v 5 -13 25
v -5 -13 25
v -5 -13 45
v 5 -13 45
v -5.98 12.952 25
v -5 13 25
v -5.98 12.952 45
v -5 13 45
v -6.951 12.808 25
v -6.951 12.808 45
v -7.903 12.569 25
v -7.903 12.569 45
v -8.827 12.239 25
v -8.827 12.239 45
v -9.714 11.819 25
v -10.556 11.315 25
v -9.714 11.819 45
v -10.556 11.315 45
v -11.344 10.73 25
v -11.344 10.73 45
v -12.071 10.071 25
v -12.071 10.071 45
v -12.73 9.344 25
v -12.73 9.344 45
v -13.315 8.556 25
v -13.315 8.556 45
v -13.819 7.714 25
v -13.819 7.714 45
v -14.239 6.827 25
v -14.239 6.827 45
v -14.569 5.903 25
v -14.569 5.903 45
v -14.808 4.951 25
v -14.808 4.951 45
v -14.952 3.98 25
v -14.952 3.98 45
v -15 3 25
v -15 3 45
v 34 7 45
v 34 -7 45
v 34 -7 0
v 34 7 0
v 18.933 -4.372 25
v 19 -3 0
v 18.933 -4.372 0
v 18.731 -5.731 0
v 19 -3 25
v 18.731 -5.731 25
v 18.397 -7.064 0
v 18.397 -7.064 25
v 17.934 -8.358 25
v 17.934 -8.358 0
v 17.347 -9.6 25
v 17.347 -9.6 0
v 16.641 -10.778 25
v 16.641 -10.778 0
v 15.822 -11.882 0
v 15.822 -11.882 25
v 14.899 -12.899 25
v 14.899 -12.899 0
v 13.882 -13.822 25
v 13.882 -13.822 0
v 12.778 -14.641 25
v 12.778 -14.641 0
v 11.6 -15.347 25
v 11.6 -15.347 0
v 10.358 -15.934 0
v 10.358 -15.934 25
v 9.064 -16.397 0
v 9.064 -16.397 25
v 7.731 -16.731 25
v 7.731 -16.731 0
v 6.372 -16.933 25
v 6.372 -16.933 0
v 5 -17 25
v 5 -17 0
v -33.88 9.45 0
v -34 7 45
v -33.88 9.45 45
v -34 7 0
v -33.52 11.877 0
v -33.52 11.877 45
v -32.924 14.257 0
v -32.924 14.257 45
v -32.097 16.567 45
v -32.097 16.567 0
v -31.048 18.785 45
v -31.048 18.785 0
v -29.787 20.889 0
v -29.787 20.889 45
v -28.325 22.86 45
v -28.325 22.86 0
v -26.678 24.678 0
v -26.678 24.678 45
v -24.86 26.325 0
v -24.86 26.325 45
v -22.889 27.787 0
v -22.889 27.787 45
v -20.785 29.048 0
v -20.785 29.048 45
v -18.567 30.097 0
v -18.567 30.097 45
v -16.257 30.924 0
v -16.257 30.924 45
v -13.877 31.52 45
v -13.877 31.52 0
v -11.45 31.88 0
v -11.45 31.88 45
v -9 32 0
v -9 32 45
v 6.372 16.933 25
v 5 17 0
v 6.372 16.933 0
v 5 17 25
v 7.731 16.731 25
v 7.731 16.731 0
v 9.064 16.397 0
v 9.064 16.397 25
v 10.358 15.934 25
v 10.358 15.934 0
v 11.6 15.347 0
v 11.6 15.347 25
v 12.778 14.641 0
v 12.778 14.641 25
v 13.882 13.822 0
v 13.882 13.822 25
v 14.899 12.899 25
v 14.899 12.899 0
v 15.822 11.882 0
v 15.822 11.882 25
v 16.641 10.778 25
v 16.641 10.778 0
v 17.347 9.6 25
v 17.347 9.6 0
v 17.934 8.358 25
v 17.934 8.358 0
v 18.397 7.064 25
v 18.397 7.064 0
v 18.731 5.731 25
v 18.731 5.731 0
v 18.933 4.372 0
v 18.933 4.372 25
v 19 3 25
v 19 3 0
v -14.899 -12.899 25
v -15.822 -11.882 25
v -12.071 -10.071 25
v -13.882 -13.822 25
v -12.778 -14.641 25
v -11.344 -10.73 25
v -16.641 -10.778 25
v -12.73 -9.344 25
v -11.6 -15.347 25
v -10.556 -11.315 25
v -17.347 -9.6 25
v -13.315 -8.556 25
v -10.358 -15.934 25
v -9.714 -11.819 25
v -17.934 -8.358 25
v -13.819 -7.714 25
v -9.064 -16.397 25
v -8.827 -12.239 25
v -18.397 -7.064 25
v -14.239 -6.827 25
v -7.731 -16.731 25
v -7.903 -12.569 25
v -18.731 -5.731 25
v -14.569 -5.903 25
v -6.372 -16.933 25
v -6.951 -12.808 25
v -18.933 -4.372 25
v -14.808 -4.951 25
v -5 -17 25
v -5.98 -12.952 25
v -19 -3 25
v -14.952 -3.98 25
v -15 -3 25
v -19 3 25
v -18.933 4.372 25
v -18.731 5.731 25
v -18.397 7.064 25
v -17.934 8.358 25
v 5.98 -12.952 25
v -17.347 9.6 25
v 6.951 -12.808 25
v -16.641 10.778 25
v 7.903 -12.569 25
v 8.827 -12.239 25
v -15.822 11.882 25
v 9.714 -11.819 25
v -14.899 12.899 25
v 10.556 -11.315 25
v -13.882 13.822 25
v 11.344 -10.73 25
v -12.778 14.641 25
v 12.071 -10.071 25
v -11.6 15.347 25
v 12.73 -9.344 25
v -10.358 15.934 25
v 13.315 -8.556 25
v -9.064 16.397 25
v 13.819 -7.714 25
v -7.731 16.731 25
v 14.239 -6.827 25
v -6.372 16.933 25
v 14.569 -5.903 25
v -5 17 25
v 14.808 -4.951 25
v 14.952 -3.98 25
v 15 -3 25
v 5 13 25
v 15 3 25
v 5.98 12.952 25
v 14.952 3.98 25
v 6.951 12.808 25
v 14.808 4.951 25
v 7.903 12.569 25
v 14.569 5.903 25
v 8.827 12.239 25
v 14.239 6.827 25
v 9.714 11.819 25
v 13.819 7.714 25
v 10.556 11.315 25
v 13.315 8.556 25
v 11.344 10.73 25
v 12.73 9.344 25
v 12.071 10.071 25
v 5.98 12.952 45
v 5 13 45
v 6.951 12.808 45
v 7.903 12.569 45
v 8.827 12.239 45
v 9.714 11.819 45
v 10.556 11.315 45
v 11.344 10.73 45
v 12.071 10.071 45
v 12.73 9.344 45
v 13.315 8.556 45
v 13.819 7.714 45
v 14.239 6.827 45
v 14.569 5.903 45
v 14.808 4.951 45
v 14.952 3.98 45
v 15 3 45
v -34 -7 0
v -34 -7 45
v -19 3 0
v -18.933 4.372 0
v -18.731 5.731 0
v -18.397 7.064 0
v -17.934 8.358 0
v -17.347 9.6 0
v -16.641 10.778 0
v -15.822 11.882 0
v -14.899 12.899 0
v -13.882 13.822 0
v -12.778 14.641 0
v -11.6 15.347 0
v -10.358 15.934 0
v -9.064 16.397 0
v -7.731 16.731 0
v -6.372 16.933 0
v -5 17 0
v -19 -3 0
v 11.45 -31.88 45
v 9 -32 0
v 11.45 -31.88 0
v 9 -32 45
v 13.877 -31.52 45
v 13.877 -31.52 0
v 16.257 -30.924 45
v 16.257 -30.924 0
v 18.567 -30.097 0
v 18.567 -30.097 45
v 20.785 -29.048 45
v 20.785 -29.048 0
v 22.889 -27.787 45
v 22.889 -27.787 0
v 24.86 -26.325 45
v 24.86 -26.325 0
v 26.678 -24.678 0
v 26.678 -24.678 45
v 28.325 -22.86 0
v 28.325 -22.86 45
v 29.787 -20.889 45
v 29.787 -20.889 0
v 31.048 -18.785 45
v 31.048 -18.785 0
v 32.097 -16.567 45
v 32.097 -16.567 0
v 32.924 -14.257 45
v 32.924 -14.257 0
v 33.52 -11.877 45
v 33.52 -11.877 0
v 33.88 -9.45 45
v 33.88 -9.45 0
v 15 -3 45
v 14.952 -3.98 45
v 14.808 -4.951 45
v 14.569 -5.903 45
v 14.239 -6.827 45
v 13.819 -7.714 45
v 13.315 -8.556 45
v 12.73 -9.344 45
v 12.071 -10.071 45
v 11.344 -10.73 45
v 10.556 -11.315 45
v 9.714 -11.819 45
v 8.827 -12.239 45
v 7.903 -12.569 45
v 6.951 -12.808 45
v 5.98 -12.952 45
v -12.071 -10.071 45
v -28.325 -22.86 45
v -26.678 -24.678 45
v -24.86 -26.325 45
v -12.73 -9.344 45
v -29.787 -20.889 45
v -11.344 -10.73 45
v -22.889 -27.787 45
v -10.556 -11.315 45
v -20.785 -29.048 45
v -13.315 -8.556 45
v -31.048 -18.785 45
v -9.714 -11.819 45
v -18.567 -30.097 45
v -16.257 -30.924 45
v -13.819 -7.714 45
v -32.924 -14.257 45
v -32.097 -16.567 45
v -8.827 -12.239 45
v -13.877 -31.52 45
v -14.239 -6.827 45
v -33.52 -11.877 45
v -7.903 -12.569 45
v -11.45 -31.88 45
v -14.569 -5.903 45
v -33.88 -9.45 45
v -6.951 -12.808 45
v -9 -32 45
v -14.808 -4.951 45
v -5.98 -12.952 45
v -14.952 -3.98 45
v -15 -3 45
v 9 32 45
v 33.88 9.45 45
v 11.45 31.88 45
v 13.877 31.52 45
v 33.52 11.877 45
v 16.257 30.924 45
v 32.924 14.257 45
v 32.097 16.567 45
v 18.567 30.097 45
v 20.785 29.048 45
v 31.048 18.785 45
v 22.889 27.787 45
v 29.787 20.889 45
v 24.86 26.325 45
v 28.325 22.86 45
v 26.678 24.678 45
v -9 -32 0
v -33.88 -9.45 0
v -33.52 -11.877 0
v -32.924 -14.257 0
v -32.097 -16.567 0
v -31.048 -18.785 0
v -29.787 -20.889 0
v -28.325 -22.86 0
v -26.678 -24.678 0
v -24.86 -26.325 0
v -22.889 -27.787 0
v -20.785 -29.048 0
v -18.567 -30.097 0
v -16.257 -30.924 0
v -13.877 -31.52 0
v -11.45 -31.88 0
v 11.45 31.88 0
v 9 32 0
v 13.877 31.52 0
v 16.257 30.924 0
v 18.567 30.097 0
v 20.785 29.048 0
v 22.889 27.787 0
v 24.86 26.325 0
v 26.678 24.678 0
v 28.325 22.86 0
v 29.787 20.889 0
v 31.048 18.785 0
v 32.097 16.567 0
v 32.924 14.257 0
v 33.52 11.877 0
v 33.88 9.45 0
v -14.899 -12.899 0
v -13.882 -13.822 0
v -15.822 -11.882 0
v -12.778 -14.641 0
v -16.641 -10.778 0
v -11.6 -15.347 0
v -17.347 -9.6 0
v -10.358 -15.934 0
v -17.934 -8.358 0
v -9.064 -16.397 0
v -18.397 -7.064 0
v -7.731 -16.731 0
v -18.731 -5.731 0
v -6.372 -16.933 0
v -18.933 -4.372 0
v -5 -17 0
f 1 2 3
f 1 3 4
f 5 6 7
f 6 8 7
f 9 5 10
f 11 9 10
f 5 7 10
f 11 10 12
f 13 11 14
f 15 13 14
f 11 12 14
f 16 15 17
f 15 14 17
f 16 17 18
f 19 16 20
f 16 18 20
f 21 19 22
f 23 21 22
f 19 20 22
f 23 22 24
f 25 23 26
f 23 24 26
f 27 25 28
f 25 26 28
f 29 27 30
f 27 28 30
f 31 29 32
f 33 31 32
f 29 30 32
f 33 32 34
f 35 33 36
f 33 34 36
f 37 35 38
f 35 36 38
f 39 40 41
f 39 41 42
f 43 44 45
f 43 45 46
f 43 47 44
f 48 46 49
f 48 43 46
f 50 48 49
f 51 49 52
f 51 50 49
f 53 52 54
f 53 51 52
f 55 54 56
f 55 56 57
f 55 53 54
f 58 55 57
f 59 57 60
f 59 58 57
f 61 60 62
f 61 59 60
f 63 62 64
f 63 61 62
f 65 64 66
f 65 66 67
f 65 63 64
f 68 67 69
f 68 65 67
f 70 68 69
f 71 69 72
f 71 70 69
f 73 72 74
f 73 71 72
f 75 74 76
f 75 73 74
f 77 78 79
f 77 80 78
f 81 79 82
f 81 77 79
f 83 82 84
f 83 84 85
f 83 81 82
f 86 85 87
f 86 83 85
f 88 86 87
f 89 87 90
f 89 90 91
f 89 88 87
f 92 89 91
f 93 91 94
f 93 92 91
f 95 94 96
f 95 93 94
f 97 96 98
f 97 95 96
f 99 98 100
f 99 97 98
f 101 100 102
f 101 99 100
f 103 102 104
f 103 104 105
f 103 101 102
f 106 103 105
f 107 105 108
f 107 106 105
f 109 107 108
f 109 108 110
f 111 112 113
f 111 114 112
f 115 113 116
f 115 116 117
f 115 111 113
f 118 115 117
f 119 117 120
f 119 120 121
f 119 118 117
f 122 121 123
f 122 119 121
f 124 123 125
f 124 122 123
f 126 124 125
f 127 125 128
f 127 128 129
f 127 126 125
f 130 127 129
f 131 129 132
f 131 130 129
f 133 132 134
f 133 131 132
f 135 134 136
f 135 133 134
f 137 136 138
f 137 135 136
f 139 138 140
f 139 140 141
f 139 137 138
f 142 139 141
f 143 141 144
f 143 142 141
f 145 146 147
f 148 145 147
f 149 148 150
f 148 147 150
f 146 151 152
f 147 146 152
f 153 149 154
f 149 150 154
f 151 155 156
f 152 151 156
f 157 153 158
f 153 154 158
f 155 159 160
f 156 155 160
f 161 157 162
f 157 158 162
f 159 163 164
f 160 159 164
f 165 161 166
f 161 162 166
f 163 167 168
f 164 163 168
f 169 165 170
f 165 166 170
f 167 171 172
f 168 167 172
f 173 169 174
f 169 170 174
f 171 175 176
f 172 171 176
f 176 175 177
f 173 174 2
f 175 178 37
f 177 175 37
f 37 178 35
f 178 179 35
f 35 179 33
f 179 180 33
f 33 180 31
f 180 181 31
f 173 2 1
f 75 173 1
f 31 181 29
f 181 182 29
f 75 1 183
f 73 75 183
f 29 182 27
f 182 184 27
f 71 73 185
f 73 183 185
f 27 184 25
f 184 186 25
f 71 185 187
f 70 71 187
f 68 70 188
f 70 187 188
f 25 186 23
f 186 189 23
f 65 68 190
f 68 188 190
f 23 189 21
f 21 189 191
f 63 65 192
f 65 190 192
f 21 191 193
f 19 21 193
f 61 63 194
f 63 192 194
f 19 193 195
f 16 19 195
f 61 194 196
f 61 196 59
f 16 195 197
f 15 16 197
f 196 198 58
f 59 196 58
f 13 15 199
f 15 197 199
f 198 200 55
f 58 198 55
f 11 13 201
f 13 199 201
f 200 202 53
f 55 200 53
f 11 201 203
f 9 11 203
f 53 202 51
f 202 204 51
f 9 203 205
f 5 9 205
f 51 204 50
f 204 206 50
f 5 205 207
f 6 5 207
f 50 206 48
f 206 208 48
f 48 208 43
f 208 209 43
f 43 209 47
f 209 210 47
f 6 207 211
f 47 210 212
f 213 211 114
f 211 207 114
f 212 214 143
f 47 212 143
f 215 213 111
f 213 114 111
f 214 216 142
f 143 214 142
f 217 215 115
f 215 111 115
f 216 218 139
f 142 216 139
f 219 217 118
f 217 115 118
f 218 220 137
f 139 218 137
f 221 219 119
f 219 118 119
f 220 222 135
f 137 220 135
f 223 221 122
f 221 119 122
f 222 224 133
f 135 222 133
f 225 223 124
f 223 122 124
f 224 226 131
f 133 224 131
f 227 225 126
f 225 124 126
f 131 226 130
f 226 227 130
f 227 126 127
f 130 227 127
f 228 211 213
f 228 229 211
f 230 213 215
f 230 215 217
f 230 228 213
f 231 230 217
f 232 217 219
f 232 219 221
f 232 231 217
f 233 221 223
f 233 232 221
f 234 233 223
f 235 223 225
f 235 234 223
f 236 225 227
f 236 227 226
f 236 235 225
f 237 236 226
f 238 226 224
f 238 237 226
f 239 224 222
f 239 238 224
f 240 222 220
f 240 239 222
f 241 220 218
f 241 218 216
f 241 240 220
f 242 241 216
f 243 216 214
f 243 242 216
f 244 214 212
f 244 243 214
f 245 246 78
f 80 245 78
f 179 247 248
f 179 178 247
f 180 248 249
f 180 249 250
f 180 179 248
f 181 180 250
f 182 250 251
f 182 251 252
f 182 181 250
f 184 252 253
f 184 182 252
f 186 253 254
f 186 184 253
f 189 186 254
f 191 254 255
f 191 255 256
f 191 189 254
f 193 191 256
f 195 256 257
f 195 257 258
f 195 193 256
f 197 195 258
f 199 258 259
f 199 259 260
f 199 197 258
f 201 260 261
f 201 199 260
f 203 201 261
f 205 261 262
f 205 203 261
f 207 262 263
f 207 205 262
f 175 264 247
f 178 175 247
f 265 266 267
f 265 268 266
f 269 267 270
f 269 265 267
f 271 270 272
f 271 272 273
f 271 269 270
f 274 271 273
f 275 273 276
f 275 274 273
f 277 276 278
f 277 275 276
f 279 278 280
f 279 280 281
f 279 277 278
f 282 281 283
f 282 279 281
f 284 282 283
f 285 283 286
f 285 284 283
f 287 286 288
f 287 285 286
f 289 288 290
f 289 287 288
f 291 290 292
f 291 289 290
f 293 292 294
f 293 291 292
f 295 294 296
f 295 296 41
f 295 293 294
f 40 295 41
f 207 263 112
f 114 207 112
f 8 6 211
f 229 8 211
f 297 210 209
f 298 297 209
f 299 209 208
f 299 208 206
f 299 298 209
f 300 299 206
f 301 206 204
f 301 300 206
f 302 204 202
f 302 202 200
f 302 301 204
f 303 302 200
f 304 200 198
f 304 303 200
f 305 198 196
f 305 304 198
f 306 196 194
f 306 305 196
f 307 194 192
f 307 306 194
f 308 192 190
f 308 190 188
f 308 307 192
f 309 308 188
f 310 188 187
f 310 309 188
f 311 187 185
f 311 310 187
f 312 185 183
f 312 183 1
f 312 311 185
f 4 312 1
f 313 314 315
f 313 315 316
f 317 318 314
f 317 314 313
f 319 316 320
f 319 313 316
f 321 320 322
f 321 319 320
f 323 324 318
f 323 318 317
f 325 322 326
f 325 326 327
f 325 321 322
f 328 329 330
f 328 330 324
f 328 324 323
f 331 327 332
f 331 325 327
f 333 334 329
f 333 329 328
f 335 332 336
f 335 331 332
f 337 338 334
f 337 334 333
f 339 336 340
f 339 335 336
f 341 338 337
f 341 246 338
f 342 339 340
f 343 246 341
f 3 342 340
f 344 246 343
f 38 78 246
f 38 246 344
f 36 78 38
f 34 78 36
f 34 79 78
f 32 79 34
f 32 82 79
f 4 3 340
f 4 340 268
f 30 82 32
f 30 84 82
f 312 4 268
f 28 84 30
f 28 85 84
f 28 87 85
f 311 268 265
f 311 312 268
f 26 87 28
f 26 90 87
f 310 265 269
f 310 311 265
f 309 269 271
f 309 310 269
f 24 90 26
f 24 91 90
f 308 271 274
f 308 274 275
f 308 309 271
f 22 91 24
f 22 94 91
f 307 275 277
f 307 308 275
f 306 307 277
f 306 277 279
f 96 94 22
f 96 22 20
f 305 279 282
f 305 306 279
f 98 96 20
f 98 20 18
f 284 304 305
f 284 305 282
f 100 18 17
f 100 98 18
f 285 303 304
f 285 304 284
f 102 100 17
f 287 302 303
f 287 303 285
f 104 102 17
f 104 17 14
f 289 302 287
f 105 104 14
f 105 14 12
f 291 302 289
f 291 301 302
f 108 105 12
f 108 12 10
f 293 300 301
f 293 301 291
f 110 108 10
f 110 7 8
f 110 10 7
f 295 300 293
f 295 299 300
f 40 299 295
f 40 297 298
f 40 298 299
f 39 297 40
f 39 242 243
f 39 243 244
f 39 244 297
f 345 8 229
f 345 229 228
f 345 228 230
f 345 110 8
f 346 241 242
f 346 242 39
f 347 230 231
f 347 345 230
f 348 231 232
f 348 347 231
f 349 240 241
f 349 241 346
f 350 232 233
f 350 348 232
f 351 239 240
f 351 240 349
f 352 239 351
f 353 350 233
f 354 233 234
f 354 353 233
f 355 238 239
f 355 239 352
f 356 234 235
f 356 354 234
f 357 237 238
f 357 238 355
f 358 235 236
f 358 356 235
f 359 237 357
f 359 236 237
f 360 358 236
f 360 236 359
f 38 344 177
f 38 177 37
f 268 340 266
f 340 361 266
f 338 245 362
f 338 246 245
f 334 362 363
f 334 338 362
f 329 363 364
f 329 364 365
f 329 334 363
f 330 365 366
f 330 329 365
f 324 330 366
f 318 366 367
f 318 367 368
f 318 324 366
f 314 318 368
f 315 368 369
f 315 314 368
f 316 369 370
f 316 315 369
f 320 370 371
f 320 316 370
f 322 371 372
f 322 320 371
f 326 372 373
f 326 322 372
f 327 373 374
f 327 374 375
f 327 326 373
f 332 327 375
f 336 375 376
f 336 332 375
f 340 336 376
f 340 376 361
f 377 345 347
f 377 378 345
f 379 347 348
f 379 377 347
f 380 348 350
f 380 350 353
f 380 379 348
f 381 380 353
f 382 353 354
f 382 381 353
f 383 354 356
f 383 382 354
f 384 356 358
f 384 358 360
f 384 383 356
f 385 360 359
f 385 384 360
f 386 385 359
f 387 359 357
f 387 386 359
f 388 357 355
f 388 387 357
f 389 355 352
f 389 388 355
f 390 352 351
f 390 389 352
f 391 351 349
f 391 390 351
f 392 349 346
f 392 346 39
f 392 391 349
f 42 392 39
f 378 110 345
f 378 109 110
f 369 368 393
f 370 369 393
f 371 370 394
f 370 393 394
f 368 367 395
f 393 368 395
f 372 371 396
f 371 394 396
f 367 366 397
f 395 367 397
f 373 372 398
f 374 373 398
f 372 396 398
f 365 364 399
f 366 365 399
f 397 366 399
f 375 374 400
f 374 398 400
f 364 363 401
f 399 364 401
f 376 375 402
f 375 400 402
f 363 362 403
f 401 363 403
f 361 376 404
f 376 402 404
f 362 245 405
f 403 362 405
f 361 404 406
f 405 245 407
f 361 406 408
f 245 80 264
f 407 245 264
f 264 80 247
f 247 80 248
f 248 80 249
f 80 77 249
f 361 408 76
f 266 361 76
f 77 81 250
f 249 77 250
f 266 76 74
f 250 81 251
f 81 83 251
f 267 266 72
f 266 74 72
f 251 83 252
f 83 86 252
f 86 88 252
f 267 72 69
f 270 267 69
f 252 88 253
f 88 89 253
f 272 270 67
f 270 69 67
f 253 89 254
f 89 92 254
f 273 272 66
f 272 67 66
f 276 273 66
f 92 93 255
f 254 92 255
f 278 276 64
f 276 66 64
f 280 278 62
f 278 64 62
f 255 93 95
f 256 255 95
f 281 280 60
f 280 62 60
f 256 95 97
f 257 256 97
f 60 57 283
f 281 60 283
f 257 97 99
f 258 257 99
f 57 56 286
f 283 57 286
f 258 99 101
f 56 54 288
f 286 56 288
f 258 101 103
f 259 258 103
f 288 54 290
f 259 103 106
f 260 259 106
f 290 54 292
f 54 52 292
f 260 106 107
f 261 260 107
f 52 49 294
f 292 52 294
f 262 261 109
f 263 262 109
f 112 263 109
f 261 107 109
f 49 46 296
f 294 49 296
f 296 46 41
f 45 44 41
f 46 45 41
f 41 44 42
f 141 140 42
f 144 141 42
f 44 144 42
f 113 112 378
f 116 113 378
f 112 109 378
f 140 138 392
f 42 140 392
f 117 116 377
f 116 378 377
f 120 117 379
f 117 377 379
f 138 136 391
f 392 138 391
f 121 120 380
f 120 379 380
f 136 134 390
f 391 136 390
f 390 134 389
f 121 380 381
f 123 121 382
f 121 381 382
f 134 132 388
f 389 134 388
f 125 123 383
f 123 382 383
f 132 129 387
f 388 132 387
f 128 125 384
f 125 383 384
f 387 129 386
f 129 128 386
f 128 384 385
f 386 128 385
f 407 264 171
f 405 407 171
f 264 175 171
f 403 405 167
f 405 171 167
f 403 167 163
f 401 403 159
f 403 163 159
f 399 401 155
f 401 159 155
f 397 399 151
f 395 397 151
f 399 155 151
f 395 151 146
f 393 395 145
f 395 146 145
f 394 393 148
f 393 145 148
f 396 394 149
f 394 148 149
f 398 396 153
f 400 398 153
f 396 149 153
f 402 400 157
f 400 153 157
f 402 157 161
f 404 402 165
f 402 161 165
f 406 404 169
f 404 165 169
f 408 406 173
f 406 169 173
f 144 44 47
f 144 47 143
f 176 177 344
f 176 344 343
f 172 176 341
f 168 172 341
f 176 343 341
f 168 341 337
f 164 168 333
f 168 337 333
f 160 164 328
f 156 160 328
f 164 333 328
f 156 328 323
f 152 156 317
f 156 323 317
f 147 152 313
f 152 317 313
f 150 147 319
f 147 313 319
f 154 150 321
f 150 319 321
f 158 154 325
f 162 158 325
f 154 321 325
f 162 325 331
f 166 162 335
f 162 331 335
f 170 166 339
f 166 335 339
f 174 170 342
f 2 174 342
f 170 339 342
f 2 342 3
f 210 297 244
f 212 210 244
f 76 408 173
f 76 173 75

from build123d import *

# Parameters (mm, degrees)
F0_W     = 68
F0_H     = 64
F0_W_2   = 38
F0_H_2   = 34
F1_DEPTH = 25
F2_W     = 68
F2_H     = 64
F2_W_2   = 38
F2_H_2   = 34
F2_W_3   = 29.9999998808
F2_H_3   = 25.9999998808
F3_DEPTH = 20
F4_R     = 10
F5_R     = 14
F6_R     = 25


with BuildPart() as f1:
    # F0 (on Top) → F1 (new body)
    with BuildSketch(Plane.XY):
        Rectangle(F0_W, F0_H)
        Rectangle(F0_W_2, F0_H_2, mode=Mode.SUBTRACT)
    extrude(amount=F1_DEPTH)

    # F2 (on face) → F3 (join)
    with BuildSketch(Plane.XY.offset(25)):
        Rectangle(F2_W, F2_H)
        Rectangle(F2_W_2, F2_H_2, mode=Mode.SUBTRACT)
        Rectangle(F2_W_2, F2_H_2)
        Rectangle(F2_W_3, F2_H_3, mode=Mode.SUBTRACT)
    extrude(amount=F3_DEPTH)

    # F4
    f4_edges = [f1.edges().sort_by_distance(p)[0] for p in [
        (-15, 13, 35),
        (-15, -13, 35),
        (15, -13, 35),
        (15, 13, 35),
    ]]
    fillet(f4_edges, radius=F4_R)

    # F5
    f5_edges = [f1.edges().sort_by_distance(p)[0] for p in [
        (19, -17, 12.5),
        (19, 17, 12.5),
        (-19, 17, 12.5),
        (-19, -17, 12.5),
    ]]
    fillet(f5_edges, radius=F5_R)

    # F6
    f6_edges = [f1.edges().sort_by_distance(p)[0] for p in [
        (34, 32, 22.5),
        (-34, 32, 22.5),
        (34, -32, 22.5),
        (-34, -32, 22.5),
    ]]
    fillet(f6_edges, radius=F6_R)


solid = f1.part
